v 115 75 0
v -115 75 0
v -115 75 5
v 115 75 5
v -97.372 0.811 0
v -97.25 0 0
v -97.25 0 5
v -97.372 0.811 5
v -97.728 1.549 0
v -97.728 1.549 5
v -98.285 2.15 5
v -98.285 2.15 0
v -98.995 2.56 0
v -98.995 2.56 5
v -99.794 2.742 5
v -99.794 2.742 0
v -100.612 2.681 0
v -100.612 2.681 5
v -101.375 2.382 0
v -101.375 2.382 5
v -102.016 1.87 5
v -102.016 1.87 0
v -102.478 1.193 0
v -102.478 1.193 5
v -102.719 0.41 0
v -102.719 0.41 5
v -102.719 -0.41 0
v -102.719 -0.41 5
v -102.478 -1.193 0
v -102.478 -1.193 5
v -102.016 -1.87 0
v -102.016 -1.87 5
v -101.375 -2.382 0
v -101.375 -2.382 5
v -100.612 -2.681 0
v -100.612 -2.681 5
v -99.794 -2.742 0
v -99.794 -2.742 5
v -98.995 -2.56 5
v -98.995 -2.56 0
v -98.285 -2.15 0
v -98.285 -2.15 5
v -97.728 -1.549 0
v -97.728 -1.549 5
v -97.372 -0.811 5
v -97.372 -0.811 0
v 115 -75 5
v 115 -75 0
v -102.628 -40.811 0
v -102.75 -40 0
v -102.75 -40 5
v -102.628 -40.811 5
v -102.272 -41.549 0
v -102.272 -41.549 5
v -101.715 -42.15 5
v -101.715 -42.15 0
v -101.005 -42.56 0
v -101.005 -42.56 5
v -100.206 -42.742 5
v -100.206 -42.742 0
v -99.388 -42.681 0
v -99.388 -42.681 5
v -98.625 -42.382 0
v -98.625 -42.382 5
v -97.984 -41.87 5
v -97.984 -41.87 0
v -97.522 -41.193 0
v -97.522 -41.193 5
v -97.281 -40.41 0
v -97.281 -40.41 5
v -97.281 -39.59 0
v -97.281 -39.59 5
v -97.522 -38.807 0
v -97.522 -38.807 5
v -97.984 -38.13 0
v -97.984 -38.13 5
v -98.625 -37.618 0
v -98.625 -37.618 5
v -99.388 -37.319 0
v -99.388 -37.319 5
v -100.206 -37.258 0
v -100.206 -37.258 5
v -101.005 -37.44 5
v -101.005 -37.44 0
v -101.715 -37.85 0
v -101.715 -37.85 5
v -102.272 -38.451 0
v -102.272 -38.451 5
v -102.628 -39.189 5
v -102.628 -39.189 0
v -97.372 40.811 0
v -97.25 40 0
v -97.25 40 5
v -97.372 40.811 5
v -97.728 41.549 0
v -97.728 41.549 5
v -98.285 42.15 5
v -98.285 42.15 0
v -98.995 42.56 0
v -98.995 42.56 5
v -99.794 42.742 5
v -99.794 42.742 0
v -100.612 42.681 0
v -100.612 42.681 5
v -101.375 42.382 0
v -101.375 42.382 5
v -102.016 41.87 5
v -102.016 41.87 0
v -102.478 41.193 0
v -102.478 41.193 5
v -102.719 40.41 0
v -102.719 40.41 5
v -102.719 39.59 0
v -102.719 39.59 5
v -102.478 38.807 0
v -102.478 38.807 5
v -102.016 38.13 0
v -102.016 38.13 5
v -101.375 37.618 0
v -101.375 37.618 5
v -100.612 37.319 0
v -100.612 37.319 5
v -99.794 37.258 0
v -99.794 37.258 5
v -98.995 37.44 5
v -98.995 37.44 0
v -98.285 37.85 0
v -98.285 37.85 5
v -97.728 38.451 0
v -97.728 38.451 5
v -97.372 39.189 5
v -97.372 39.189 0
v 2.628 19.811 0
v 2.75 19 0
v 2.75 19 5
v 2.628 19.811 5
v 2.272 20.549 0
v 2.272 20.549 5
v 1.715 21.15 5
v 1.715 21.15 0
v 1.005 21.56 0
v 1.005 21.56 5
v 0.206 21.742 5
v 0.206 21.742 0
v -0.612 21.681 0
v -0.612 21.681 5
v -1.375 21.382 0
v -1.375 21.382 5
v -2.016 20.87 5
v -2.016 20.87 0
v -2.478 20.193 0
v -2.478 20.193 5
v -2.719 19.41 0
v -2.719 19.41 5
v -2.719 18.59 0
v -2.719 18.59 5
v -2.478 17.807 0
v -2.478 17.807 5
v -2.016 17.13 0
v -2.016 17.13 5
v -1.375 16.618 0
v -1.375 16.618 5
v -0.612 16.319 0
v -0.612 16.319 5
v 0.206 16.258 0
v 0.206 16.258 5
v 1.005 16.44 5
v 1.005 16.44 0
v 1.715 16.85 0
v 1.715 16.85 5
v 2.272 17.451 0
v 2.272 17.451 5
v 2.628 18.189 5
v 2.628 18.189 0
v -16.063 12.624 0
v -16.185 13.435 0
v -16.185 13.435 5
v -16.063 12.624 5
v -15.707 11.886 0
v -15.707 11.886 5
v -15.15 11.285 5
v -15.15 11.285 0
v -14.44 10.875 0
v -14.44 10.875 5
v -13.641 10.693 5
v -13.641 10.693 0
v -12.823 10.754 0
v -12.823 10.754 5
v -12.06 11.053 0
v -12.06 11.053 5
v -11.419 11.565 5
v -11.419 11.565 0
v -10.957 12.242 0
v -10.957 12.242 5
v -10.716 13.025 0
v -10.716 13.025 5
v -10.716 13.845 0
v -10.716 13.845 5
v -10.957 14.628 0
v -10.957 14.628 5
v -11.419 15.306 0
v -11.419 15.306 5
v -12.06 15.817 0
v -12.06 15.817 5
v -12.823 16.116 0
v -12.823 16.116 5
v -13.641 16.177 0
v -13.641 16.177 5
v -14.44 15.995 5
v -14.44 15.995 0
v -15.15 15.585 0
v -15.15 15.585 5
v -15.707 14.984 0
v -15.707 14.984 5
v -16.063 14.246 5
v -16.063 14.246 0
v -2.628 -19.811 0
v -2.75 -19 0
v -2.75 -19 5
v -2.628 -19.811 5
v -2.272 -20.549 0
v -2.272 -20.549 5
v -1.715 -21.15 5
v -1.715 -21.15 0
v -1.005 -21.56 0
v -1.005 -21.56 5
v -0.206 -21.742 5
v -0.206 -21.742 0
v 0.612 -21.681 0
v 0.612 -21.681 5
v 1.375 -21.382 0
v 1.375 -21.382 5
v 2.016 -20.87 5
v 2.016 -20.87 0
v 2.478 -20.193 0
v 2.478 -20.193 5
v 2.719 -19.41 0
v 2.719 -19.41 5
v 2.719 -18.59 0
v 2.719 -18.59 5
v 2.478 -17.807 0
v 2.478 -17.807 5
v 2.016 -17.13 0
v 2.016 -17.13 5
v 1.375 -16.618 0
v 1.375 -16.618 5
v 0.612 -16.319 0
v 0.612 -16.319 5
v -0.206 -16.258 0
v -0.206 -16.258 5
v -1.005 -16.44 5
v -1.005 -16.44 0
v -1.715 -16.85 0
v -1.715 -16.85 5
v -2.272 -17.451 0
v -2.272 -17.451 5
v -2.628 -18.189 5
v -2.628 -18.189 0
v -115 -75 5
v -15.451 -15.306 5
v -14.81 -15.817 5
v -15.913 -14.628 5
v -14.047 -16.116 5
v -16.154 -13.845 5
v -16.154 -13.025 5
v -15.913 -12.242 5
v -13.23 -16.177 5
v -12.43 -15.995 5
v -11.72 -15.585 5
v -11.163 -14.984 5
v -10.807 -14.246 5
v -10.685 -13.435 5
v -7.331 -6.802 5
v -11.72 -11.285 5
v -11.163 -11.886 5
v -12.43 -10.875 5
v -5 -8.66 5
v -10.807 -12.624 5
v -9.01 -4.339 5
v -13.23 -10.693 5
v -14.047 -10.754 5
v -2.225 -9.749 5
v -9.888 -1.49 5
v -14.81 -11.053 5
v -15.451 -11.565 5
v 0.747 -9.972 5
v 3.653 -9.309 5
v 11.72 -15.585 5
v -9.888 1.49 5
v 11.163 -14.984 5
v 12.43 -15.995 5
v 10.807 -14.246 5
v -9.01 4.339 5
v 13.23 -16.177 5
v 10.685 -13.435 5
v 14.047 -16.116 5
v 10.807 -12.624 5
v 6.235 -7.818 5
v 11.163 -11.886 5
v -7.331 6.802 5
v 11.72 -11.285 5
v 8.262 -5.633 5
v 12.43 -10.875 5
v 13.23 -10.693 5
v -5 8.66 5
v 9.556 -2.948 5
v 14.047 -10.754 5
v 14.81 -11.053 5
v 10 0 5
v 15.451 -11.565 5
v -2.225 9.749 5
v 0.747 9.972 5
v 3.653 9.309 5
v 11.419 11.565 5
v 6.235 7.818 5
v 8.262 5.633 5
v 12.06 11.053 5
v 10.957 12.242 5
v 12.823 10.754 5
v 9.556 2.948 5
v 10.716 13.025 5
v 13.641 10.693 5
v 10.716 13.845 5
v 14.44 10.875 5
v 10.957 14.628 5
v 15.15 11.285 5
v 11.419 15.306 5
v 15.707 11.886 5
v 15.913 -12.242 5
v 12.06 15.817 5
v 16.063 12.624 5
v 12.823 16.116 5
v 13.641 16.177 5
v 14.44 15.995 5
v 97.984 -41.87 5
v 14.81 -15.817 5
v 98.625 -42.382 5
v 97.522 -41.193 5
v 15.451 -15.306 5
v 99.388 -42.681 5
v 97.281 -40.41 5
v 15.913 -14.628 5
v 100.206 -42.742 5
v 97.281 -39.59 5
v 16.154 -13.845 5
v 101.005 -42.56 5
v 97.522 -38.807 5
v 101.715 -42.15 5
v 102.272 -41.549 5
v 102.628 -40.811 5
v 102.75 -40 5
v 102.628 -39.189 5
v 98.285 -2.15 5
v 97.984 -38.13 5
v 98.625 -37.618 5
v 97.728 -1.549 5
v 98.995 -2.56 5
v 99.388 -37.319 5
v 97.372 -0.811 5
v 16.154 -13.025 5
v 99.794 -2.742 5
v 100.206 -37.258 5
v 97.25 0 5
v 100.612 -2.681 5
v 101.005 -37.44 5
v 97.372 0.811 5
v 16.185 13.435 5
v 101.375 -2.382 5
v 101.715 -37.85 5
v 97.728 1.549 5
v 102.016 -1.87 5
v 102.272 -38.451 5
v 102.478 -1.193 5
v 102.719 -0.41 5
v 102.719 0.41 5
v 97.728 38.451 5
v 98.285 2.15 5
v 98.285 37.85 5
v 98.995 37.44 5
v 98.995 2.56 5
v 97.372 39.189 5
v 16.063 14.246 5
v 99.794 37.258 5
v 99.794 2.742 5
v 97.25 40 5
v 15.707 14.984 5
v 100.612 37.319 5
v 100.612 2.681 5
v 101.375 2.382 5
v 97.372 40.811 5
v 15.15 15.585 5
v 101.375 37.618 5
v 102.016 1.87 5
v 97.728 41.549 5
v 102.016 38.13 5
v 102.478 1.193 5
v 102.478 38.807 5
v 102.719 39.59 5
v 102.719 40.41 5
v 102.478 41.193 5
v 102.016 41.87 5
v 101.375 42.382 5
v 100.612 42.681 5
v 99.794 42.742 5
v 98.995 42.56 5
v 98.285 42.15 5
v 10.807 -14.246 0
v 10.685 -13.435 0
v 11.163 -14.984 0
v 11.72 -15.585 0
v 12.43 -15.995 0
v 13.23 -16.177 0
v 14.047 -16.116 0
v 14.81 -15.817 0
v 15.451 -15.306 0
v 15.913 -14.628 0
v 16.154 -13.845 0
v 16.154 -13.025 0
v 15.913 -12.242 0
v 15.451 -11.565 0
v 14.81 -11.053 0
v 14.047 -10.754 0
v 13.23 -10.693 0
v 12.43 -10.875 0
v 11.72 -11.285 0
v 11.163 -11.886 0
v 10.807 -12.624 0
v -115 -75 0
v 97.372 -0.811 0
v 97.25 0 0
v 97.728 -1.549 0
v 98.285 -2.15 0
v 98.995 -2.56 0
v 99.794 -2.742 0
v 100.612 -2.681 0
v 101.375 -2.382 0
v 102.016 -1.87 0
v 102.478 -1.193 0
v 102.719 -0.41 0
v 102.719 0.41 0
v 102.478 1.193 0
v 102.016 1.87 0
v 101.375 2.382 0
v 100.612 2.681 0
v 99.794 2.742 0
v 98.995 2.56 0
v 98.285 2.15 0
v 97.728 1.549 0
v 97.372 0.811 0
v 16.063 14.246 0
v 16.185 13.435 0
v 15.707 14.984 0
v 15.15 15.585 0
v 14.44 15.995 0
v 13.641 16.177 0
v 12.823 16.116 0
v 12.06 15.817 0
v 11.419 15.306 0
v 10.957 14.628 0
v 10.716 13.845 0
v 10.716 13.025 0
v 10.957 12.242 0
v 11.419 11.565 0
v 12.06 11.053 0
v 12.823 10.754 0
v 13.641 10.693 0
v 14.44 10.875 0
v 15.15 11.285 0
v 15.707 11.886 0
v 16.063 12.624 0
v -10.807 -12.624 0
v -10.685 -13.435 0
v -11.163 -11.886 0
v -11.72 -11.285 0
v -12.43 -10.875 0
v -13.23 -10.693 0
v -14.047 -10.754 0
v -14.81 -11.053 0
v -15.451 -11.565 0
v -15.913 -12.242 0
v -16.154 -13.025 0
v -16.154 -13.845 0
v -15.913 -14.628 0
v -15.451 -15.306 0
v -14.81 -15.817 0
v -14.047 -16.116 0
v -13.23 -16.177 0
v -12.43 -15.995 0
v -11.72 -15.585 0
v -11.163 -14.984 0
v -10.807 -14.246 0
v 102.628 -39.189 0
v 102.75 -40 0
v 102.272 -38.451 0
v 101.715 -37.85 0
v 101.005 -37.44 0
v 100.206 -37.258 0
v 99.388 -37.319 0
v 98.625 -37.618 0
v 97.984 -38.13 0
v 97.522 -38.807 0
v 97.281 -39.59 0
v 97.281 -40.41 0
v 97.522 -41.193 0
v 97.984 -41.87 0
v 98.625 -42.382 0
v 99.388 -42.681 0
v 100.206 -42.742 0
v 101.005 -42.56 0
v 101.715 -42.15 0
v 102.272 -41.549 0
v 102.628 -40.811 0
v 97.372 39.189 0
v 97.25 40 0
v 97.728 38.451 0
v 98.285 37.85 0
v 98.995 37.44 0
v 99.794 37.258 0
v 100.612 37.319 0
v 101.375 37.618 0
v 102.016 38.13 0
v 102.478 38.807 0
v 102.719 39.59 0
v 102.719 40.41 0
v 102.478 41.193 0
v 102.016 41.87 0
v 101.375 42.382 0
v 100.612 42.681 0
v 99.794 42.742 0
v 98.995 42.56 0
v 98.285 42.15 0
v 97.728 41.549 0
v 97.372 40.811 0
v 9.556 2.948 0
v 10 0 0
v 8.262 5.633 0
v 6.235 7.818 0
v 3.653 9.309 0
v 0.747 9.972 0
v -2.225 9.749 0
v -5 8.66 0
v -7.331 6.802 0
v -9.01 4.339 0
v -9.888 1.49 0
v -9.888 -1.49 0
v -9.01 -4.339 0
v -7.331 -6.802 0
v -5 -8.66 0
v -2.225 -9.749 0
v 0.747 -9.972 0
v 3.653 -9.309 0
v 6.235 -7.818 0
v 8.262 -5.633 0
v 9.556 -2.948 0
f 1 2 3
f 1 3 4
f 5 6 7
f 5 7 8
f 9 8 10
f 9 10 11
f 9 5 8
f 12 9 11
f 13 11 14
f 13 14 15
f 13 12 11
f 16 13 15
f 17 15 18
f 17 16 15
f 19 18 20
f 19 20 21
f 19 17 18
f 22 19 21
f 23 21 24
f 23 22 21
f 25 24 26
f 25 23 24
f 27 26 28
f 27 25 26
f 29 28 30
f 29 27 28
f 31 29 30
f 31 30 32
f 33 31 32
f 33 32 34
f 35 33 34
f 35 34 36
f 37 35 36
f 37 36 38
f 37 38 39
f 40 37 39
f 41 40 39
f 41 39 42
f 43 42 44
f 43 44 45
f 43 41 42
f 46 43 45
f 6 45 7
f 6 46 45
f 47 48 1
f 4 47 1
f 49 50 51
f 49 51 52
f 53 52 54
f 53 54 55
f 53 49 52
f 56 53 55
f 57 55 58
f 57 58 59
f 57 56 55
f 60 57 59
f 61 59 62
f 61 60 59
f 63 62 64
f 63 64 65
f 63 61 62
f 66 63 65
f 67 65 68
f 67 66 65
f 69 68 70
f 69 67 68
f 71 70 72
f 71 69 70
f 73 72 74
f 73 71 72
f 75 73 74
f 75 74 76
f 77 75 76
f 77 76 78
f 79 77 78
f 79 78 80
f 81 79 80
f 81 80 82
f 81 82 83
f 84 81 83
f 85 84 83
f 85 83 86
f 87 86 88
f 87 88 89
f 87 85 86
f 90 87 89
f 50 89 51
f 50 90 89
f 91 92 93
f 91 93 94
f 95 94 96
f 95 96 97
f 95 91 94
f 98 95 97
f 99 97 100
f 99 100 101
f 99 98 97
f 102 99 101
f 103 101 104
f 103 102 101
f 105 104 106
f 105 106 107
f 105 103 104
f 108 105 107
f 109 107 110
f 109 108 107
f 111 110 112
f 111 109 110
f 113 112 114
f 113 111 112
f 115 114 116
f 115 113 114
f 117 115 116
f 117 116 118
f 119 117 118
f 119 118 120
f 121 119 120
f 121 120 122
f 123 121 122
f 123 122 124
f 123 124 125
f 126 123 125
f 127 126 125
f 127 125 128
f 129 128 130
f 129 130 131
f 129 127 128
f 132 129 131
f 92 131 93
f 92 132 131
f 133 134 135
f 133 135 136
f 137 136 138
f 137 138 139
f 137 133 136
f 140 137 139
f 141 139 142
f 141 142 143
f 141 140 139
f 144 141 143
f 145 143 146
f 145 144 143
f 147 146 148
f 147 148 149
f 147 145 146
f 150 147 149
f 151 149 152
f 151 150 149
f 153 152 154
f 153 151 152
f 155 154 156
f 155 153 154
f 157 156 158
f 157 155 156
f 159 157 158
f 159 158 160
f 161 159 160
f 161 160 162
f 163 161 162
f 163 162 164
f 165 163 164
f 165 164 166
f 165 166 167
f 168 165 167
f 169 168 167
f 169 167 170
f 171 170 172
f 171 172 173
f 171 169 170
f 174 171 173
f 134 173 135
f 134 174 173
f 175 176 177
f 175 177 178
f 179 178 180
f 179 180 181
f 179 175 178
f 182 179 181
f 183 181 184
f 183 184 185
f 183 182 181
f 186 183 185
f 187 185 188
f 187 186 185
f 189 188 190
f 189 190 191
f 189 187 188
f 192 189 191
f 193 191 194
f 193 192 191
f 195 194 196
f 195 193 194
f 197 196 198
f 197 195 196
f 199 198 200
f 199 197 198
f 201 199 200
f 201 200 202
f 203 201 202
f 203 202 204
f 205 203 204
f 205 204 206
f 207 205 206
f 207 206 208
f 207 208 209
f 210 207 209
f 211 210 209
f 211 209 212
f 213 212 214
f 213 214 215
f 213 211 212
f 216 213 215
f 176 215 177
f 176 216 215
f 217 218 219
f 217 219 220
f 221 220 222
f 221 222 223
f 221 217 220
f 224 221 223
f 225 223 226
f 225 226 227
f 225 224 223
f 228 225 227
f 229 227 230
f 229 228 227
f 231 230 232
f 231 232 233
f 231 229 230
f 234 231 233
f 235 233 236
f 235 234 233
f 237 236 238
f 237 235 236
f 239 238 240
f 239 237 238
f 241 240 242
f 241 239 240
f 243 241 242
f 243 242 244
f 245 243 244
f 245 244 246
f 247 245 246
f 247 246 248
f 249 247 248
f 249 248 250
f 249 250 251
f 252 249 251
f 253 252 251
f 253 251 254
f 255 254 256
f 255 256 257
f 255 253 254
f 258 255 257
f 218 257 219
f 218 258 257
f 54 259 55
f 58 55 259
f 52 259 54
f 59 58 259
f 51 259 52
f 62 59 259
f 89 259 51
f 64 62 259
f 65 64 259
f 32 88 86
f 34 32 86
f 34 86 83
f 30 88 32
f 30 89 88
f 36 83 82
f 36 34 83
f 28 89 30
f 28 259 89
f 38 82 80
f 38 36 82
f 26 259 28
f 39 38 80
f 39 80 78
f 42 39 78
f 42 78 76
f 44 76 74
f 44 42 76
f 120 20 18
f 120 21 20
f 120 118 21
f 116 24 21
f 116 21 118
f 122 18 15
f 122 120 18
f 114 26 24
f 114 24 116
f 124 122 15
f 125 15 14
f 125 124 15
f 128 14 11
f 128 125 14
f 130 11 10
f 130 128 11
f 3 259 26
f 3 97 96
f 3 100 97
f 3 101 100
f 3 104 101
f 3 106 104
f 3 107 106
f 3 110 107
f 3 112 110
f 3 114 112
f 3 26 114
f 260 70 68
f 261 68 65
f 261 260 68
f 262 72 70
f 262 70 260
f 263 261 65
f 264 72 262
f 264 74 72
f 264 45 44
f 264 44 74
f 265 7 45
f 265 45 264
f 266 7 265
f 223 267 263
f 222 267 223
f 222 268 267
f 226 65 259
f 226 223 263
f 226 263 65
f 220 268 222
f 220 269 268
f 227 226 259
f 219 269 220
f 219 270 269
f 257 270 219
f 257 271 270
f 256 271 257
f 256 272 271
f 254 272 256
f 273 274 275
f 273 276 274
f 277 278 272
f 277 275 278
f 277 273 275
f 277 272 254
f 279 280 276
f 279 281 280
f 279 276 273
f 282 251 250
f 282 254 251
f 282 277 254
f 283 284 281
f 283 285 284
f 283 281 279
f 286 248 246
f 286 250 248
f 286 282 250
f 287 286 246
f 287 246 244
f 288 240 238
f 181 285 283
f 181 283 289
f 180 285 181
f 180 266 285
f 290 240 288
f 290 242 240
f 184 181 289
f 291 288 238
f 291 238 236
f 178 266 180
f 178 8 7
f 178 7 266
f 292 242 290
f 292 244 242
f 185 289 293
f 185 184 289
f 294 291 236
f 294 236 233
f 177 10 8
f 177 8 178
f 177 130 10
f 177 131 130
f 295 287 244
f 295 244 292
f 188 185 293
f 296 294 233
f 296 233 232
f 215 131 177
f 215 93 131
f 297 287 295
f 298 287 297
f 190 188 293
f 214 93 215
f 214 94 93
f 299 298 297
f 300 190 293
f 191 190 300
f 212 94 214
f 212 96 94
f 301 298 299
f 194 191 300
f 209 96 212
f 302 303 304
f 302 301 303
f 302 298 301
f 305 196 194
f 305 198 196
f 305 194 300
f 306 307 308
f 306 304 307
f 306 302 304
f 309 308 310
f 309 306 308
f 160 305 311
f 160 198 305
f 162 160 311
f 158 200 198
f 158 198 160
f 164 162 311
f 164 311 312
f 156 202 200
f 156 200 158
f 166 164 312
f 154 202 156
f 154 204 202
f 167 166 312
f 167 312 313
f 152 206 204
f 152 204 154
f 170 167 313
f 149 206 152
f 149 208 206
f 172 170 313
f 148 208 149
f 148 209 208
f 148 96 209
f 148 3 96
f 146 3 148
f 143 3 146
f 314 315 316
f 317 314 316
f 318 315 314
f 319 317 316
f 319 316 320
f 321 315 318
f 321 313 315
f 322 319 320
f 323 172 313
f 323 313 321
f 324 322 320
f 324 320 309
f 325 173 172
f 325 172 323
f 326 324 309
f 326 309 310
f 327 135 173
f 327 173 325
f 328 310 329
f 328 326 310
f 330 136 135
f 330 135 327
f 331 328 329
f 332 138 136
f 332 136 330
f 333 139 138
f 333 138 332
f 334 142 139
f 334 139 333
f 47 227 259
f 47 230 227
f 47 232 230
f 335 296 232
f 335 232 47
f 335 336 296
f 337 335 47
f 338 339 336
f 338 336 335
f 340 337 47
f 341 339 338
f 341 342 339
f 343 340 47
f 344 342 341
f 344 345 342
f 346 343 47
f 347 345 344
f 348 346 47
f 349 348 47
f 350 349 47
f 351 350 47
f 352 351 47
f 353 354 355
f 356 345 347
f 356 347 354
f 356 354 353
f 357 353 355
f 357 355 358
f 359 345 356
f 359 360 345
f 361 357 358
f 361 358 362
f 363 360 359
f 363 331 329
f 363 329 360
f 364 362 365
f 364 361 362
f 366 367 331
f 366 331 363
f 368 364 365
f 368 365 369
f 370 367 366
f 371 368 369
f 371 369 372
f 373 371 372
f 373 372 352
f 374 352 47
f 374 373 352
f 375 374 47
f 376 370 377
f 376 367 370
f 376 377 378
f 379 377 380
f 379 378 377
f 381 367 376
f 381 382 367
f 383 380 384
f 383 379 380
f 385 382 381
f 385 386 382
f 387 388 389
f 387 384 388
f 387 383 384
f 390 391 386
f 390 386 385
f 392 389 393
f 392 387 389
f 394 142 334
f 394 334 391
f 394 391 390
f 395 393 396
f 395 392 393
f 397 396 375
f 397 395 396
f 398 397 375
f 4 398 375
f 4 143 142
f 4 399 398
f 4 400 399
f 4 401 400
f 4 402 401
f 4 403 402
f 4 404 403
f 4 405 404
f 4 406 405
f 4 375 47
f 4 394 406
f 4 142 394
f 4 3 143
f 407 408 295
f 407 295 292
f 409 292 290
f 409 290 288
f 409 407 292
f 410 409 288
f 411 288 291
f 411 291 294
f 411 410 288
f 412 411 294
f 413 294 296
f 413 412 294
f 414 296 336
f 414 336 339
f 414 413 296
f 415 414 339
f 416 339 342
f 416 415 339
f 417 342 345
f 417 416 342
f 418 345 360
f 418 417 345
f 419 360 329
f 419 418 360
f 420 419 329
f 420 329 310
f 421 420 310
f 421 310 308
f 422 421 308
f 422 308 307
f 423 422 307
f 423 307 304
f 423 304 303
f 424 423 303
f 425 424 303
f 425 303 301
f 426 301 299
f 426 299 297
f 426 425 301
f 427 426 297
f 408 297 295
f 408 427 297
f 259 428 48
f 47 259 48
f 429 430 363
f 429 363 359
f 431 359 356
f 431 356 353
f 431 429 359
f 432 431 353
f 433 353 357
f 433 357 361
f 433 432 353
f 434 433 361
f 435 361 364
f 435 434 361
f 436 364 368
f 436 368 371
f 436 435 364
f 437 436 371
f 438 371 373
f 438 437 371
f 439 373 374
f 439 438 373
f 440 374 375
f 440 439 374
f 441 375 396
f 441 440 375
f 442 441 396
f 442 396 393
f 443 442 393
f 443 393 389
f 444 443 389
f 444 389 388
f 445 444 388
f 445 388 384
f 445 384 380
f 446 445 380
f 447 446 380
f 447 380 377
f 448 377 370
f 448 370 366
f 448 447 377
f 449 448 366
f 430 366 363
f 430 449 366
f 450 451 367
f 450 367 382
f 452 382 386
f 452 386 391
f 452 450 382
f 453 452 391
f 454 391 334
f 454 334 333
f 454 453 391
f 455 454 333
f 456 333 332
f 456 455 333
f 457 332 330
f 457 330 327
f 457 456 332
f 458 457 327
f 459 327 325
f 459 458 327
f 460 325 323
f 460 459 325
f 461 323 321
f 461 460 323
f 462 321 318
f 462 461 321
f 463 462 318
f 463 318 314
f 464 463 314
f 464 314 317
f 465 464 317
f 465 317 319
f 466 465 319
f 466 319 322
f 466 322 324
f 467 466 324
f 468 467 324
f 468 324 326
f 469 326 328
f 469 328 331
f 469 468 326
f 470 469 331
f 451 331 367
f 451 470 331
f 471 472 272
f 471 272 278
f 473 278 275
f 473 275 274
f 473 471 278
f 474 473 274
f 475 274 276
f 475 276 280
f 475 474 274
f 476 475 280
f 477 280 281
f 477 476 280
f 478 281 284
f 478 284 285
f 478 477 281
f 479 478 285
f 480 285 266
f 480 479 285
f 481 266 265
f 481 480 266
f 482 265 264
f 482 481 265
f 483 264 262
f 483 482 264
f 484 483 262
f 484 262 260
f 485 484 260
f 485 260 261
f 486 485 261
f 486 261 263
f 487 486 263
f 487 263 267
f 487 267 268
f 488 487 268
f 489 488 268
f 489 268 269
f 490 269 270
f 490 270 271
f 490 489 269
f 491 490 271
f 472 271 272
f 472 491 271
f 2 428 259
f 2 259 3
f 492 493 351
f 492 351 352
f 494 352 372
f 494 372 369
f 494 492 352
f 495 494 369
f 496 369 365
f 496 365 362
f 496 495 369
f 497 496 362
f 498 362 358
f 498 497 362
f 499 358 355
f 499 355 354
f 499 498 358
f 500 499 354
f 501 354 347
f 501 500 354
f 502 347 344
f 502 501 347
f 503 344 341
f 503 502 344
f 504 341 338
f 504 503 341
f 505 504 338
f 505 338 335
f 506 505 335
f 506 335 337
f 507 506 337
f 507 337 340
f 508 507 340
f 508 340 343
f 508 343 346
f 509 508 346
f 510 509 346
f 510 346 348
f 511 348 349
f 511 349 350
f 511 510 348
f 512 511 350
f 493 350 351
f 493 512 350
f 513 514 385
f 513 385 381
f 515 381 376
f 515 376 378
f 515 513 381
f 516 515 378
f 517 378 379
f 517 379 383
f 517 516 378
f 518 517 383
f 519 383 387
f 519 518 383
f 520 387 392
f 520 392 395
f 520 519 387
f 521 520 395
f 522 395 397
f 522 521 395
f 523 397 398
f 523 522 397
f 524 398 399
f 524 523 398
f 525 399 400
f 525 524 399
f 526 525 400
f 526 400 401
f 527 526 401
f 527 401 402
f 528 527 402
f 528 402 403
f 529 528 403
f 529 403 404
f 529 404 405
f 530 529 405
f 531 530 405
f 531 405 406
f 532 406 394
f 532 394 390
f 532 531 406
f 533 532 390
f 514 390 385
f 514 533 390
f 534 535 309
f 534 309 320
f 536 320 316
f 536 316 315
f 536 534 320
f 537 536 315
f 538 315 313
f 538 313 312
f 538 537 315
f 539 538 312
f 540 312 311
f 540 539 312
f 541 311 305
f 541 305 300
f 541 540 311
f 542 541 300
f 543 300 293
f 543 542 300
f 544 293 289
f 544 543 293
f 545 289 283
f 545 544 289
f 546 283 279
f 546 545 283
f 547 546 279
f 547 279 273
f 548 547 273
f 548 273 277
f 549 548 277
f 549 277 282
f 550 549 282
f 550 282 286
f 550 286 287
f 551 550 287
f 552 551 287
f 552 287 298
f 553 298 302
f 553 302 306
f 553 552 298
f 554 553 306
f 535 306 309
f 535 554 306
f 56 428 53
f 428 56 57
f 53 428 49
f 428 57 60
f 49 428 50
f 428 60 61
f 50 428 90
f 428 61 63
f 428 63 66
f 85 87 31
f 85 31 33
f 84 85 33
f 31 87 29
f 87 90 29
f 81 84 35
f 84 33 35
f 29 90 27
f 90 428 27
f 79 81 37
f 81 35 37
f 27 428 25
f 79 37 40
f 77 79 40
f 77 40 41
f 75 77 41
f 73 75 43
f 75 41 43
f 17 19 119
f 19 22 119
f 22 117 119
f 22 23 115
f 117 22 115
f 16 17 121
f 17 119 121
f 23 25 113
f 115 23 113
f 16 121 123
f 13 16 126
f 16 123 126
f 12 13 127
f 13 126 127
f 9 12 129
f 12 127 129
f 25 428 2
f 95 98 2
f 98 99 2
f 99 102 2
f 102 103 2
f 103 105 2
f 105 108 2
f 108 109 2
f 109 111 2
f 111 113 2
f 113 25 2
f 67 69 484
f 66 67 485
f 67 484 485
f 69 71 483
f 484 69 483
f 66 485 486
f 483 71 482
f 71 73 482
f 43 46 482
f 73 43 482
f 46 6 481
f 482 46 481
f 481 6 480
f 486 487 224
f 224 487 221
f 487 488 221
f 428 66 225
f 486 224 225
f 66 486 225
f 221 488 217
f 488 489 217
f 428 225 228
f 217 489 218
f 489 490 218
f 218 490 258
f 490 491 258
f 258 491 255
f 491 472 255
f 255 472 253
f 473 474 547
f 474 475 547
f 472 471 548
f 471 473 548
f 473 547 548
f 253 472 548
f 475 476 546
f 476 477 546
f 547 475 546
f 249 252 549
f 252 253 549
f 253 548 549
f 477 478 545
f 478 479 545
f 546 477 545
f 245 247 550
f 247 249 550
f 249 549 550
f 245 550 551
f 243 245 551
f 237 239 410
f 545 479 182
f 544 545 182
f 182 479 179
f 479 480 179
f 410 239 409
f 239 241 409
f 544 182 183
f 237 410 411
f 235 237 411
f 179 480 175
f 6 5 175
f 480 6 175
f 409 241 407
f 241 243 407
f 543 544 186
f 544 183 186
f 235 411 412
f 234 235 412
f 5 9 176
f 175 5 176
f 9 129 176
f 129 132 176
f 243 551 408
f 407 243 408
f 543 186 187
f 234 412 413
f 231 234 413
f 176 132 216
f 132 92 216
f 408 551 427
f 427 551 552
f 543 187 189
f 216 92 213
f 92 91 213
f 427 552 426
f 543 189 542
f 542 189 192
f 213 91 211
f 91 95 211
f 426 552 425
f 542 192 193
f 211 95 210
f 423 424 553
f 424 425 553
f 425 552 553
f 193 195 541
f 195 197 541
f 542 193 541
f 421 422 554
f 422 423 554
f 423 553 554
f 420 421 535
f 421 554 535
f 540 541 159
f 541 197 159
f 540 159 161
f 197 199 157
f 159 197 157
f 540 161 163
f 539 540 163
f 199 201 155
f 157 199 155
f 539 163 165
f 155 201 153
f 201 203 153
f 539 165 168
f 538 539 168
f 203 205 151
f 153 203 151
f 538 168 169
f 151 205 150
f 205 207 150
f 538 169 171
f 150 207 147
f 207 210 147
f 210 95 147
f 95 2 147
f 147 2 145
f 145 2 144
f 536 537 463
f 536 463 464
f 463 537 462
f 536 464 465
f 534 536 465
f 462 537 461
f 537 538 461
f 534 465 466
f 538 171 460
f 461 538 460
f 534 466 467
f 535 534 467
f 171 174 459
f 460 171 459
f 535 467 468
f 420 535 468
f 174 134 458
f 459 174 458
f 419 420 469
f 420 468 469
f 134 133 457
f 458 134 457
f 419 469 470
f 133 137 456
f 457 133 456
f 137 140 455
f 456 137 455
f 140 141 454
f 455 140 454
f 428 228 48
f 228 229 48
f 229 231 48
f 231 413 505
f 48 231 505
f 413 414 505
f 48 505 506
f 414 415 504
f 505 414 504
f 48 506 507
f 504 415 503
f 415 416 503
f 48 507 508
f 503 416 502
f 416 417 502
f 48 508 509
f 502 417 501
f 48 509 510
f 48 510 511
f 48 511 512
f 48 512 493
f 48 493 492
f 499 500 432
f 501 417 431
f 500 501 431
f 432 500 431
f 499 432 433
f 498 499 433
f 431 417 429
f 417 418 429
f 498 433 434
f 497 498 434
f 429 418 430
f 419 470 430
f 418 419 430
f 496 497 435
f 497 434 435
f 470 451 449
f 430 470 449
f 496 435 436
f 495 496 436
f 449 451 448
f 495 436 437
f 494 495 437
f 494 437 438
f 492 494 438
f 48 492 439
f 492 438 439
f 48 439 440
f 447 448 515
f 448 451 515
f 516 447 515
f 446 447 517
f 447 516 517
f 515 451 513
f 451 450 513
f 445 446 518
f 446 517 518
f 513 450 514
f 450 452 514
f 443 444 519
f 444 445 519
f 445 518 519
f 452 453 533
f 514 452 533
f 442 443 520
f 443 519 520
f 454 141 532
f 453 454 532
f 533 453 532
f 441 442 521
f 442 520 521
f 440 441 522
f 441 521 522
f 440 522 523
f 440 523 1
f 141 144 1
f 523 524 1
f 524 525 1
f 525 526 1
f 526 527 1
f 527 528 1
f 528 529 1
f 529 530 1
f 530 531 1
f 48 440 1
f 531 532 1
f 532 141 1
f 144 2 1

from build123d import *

# Parameters (mm, degrees)
SKETCH_1_W      = 230
SKETCH_1_H      = 150
SKETCH_1_R      = 10
SKETCH_1_R_2    = 2.75
EXTRUDE_1_DEPTH = 5


with BuildPart() as part:
    # 草图1 → 凸台-拉伸1 (new body)
    with BuildSketch(Plane.XY):
        Rectangle(SKETCH_1_W, SKETCH_1_H)
        Circle(SKETCH_1_R, mode=Mode.SUBTRACT)
        with Locations((0, 19)):
            Circle(SKETCH_1_R_2, mode=Mode.SUBTRACT)
        with Locations((13.435028843, 13.435028843)):
            Circle(SKETCH_1_R_2, mode=Mode.SUBTRACT)
        with Locations(Location((-13.435028843, 13.435028843, 0), (0, 0, 180))):
            Circle(SKETCH_1_R_2, mode=Mode.SUBTRACT)
        with Locations(Location((13.435028843, -13.435028843, 0), (0, 0, 180))):
            Circle(SKETCH_1_R_2, mode=Mode.SUBTRACT)
        with Locations((-13.435028843, -13.435028843)):
            Circle(SKETCH_1_R_2, mode=Mode.SUBTRACT)
        with Locations(Location((0, -19, 0), (0, 0, 180))):
            Circle(SKETCH_1_R_2, mode=Mode.SUBTRACT)
        with Locations((-100, 0)):
            Circle(SKETCH_1_R_2, mode=Mode.SUBTRACT)
        with Locations((-100, 40)):
            Circle(SKETCH_1_R_2, mode=Mode.SUBTRACT)
        with Locations(Location((-100, -40, 0), (0, 0, 180))):
            Circle(SKETCH_1_R_2, mode=Mode.SUBTRACT)
        with Locations((100, -40)):
            Circle(SKETCH_1_R_2, mode=Mode.SUBTRACT)
        with Locations(Location((100, 0, 0), (0, 0, 180))):
            Circle(SKETCH_1_R_2, mode=Mode.SUBTRACT)
        with Locations(Location((100, 40, 0), (0, 0, 180))):
            Circle(SKETCH_1_R_2, mode=Mode.SUBTRACT)
    extrude(amount=EXTRUDE_1_DEPTH)


solid = part.part
